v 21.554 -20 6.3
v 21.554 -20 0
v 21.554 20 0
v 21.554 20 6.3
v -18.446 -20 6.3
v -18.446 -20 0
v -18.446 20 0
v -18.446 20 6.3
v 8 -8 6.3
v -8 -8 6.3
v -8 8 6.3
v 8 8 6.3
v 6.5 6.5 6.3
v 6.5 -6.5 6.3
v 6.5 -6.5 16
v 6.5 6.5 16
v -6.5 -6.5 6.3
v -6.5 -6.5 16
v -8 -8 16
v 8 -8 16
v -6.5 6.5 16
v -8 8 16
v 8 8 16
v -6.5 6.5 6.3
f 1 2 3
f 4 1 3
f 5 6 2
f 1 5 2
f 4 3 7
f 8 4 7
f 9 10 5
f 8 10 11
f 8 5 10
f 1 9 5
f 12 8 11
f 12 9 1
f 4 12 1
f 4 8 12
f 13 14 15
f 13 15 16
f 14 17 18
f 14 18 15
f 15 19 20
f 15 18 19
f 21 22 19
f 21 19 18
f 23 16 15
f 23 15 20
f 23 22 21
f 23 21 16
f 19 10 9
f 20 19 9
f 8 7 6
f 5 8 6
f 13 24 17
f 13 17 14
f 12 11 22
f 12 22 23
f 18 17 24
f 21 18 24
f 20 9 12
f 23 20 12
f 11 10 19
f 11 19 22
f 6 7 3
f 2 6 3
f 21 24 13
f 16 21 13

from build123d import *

# Parameters (mm, degrees)
F0_W     = 16
F0_H     = 16
F0_W_2   = 13
F0_H_2   = 13
F1_DEPTH = 16
F3_DEPTH = 6.3


with BuildPart() as f1:
    # F0 (on Top) → F1 (new body)
    with BuildSketch(Plane.XY):
        Rectangle(F0_W, F0_H)
        Rectangle(F0_W_2, F0_H_2, mode=Mode.SUBTRACT)
    extrude(amount=F1_DEPTH)

    # F2 (on Top) → F3 (join)
    with BuildSketch(Plane.XY):
        Polygon((-18.4455, 20), (-18.4455, -20), (21.5545, -20), (21.5545, 20), (0, 20), align=None)
    extrude(amount=F3_DEPTH)


solid = f1.part
